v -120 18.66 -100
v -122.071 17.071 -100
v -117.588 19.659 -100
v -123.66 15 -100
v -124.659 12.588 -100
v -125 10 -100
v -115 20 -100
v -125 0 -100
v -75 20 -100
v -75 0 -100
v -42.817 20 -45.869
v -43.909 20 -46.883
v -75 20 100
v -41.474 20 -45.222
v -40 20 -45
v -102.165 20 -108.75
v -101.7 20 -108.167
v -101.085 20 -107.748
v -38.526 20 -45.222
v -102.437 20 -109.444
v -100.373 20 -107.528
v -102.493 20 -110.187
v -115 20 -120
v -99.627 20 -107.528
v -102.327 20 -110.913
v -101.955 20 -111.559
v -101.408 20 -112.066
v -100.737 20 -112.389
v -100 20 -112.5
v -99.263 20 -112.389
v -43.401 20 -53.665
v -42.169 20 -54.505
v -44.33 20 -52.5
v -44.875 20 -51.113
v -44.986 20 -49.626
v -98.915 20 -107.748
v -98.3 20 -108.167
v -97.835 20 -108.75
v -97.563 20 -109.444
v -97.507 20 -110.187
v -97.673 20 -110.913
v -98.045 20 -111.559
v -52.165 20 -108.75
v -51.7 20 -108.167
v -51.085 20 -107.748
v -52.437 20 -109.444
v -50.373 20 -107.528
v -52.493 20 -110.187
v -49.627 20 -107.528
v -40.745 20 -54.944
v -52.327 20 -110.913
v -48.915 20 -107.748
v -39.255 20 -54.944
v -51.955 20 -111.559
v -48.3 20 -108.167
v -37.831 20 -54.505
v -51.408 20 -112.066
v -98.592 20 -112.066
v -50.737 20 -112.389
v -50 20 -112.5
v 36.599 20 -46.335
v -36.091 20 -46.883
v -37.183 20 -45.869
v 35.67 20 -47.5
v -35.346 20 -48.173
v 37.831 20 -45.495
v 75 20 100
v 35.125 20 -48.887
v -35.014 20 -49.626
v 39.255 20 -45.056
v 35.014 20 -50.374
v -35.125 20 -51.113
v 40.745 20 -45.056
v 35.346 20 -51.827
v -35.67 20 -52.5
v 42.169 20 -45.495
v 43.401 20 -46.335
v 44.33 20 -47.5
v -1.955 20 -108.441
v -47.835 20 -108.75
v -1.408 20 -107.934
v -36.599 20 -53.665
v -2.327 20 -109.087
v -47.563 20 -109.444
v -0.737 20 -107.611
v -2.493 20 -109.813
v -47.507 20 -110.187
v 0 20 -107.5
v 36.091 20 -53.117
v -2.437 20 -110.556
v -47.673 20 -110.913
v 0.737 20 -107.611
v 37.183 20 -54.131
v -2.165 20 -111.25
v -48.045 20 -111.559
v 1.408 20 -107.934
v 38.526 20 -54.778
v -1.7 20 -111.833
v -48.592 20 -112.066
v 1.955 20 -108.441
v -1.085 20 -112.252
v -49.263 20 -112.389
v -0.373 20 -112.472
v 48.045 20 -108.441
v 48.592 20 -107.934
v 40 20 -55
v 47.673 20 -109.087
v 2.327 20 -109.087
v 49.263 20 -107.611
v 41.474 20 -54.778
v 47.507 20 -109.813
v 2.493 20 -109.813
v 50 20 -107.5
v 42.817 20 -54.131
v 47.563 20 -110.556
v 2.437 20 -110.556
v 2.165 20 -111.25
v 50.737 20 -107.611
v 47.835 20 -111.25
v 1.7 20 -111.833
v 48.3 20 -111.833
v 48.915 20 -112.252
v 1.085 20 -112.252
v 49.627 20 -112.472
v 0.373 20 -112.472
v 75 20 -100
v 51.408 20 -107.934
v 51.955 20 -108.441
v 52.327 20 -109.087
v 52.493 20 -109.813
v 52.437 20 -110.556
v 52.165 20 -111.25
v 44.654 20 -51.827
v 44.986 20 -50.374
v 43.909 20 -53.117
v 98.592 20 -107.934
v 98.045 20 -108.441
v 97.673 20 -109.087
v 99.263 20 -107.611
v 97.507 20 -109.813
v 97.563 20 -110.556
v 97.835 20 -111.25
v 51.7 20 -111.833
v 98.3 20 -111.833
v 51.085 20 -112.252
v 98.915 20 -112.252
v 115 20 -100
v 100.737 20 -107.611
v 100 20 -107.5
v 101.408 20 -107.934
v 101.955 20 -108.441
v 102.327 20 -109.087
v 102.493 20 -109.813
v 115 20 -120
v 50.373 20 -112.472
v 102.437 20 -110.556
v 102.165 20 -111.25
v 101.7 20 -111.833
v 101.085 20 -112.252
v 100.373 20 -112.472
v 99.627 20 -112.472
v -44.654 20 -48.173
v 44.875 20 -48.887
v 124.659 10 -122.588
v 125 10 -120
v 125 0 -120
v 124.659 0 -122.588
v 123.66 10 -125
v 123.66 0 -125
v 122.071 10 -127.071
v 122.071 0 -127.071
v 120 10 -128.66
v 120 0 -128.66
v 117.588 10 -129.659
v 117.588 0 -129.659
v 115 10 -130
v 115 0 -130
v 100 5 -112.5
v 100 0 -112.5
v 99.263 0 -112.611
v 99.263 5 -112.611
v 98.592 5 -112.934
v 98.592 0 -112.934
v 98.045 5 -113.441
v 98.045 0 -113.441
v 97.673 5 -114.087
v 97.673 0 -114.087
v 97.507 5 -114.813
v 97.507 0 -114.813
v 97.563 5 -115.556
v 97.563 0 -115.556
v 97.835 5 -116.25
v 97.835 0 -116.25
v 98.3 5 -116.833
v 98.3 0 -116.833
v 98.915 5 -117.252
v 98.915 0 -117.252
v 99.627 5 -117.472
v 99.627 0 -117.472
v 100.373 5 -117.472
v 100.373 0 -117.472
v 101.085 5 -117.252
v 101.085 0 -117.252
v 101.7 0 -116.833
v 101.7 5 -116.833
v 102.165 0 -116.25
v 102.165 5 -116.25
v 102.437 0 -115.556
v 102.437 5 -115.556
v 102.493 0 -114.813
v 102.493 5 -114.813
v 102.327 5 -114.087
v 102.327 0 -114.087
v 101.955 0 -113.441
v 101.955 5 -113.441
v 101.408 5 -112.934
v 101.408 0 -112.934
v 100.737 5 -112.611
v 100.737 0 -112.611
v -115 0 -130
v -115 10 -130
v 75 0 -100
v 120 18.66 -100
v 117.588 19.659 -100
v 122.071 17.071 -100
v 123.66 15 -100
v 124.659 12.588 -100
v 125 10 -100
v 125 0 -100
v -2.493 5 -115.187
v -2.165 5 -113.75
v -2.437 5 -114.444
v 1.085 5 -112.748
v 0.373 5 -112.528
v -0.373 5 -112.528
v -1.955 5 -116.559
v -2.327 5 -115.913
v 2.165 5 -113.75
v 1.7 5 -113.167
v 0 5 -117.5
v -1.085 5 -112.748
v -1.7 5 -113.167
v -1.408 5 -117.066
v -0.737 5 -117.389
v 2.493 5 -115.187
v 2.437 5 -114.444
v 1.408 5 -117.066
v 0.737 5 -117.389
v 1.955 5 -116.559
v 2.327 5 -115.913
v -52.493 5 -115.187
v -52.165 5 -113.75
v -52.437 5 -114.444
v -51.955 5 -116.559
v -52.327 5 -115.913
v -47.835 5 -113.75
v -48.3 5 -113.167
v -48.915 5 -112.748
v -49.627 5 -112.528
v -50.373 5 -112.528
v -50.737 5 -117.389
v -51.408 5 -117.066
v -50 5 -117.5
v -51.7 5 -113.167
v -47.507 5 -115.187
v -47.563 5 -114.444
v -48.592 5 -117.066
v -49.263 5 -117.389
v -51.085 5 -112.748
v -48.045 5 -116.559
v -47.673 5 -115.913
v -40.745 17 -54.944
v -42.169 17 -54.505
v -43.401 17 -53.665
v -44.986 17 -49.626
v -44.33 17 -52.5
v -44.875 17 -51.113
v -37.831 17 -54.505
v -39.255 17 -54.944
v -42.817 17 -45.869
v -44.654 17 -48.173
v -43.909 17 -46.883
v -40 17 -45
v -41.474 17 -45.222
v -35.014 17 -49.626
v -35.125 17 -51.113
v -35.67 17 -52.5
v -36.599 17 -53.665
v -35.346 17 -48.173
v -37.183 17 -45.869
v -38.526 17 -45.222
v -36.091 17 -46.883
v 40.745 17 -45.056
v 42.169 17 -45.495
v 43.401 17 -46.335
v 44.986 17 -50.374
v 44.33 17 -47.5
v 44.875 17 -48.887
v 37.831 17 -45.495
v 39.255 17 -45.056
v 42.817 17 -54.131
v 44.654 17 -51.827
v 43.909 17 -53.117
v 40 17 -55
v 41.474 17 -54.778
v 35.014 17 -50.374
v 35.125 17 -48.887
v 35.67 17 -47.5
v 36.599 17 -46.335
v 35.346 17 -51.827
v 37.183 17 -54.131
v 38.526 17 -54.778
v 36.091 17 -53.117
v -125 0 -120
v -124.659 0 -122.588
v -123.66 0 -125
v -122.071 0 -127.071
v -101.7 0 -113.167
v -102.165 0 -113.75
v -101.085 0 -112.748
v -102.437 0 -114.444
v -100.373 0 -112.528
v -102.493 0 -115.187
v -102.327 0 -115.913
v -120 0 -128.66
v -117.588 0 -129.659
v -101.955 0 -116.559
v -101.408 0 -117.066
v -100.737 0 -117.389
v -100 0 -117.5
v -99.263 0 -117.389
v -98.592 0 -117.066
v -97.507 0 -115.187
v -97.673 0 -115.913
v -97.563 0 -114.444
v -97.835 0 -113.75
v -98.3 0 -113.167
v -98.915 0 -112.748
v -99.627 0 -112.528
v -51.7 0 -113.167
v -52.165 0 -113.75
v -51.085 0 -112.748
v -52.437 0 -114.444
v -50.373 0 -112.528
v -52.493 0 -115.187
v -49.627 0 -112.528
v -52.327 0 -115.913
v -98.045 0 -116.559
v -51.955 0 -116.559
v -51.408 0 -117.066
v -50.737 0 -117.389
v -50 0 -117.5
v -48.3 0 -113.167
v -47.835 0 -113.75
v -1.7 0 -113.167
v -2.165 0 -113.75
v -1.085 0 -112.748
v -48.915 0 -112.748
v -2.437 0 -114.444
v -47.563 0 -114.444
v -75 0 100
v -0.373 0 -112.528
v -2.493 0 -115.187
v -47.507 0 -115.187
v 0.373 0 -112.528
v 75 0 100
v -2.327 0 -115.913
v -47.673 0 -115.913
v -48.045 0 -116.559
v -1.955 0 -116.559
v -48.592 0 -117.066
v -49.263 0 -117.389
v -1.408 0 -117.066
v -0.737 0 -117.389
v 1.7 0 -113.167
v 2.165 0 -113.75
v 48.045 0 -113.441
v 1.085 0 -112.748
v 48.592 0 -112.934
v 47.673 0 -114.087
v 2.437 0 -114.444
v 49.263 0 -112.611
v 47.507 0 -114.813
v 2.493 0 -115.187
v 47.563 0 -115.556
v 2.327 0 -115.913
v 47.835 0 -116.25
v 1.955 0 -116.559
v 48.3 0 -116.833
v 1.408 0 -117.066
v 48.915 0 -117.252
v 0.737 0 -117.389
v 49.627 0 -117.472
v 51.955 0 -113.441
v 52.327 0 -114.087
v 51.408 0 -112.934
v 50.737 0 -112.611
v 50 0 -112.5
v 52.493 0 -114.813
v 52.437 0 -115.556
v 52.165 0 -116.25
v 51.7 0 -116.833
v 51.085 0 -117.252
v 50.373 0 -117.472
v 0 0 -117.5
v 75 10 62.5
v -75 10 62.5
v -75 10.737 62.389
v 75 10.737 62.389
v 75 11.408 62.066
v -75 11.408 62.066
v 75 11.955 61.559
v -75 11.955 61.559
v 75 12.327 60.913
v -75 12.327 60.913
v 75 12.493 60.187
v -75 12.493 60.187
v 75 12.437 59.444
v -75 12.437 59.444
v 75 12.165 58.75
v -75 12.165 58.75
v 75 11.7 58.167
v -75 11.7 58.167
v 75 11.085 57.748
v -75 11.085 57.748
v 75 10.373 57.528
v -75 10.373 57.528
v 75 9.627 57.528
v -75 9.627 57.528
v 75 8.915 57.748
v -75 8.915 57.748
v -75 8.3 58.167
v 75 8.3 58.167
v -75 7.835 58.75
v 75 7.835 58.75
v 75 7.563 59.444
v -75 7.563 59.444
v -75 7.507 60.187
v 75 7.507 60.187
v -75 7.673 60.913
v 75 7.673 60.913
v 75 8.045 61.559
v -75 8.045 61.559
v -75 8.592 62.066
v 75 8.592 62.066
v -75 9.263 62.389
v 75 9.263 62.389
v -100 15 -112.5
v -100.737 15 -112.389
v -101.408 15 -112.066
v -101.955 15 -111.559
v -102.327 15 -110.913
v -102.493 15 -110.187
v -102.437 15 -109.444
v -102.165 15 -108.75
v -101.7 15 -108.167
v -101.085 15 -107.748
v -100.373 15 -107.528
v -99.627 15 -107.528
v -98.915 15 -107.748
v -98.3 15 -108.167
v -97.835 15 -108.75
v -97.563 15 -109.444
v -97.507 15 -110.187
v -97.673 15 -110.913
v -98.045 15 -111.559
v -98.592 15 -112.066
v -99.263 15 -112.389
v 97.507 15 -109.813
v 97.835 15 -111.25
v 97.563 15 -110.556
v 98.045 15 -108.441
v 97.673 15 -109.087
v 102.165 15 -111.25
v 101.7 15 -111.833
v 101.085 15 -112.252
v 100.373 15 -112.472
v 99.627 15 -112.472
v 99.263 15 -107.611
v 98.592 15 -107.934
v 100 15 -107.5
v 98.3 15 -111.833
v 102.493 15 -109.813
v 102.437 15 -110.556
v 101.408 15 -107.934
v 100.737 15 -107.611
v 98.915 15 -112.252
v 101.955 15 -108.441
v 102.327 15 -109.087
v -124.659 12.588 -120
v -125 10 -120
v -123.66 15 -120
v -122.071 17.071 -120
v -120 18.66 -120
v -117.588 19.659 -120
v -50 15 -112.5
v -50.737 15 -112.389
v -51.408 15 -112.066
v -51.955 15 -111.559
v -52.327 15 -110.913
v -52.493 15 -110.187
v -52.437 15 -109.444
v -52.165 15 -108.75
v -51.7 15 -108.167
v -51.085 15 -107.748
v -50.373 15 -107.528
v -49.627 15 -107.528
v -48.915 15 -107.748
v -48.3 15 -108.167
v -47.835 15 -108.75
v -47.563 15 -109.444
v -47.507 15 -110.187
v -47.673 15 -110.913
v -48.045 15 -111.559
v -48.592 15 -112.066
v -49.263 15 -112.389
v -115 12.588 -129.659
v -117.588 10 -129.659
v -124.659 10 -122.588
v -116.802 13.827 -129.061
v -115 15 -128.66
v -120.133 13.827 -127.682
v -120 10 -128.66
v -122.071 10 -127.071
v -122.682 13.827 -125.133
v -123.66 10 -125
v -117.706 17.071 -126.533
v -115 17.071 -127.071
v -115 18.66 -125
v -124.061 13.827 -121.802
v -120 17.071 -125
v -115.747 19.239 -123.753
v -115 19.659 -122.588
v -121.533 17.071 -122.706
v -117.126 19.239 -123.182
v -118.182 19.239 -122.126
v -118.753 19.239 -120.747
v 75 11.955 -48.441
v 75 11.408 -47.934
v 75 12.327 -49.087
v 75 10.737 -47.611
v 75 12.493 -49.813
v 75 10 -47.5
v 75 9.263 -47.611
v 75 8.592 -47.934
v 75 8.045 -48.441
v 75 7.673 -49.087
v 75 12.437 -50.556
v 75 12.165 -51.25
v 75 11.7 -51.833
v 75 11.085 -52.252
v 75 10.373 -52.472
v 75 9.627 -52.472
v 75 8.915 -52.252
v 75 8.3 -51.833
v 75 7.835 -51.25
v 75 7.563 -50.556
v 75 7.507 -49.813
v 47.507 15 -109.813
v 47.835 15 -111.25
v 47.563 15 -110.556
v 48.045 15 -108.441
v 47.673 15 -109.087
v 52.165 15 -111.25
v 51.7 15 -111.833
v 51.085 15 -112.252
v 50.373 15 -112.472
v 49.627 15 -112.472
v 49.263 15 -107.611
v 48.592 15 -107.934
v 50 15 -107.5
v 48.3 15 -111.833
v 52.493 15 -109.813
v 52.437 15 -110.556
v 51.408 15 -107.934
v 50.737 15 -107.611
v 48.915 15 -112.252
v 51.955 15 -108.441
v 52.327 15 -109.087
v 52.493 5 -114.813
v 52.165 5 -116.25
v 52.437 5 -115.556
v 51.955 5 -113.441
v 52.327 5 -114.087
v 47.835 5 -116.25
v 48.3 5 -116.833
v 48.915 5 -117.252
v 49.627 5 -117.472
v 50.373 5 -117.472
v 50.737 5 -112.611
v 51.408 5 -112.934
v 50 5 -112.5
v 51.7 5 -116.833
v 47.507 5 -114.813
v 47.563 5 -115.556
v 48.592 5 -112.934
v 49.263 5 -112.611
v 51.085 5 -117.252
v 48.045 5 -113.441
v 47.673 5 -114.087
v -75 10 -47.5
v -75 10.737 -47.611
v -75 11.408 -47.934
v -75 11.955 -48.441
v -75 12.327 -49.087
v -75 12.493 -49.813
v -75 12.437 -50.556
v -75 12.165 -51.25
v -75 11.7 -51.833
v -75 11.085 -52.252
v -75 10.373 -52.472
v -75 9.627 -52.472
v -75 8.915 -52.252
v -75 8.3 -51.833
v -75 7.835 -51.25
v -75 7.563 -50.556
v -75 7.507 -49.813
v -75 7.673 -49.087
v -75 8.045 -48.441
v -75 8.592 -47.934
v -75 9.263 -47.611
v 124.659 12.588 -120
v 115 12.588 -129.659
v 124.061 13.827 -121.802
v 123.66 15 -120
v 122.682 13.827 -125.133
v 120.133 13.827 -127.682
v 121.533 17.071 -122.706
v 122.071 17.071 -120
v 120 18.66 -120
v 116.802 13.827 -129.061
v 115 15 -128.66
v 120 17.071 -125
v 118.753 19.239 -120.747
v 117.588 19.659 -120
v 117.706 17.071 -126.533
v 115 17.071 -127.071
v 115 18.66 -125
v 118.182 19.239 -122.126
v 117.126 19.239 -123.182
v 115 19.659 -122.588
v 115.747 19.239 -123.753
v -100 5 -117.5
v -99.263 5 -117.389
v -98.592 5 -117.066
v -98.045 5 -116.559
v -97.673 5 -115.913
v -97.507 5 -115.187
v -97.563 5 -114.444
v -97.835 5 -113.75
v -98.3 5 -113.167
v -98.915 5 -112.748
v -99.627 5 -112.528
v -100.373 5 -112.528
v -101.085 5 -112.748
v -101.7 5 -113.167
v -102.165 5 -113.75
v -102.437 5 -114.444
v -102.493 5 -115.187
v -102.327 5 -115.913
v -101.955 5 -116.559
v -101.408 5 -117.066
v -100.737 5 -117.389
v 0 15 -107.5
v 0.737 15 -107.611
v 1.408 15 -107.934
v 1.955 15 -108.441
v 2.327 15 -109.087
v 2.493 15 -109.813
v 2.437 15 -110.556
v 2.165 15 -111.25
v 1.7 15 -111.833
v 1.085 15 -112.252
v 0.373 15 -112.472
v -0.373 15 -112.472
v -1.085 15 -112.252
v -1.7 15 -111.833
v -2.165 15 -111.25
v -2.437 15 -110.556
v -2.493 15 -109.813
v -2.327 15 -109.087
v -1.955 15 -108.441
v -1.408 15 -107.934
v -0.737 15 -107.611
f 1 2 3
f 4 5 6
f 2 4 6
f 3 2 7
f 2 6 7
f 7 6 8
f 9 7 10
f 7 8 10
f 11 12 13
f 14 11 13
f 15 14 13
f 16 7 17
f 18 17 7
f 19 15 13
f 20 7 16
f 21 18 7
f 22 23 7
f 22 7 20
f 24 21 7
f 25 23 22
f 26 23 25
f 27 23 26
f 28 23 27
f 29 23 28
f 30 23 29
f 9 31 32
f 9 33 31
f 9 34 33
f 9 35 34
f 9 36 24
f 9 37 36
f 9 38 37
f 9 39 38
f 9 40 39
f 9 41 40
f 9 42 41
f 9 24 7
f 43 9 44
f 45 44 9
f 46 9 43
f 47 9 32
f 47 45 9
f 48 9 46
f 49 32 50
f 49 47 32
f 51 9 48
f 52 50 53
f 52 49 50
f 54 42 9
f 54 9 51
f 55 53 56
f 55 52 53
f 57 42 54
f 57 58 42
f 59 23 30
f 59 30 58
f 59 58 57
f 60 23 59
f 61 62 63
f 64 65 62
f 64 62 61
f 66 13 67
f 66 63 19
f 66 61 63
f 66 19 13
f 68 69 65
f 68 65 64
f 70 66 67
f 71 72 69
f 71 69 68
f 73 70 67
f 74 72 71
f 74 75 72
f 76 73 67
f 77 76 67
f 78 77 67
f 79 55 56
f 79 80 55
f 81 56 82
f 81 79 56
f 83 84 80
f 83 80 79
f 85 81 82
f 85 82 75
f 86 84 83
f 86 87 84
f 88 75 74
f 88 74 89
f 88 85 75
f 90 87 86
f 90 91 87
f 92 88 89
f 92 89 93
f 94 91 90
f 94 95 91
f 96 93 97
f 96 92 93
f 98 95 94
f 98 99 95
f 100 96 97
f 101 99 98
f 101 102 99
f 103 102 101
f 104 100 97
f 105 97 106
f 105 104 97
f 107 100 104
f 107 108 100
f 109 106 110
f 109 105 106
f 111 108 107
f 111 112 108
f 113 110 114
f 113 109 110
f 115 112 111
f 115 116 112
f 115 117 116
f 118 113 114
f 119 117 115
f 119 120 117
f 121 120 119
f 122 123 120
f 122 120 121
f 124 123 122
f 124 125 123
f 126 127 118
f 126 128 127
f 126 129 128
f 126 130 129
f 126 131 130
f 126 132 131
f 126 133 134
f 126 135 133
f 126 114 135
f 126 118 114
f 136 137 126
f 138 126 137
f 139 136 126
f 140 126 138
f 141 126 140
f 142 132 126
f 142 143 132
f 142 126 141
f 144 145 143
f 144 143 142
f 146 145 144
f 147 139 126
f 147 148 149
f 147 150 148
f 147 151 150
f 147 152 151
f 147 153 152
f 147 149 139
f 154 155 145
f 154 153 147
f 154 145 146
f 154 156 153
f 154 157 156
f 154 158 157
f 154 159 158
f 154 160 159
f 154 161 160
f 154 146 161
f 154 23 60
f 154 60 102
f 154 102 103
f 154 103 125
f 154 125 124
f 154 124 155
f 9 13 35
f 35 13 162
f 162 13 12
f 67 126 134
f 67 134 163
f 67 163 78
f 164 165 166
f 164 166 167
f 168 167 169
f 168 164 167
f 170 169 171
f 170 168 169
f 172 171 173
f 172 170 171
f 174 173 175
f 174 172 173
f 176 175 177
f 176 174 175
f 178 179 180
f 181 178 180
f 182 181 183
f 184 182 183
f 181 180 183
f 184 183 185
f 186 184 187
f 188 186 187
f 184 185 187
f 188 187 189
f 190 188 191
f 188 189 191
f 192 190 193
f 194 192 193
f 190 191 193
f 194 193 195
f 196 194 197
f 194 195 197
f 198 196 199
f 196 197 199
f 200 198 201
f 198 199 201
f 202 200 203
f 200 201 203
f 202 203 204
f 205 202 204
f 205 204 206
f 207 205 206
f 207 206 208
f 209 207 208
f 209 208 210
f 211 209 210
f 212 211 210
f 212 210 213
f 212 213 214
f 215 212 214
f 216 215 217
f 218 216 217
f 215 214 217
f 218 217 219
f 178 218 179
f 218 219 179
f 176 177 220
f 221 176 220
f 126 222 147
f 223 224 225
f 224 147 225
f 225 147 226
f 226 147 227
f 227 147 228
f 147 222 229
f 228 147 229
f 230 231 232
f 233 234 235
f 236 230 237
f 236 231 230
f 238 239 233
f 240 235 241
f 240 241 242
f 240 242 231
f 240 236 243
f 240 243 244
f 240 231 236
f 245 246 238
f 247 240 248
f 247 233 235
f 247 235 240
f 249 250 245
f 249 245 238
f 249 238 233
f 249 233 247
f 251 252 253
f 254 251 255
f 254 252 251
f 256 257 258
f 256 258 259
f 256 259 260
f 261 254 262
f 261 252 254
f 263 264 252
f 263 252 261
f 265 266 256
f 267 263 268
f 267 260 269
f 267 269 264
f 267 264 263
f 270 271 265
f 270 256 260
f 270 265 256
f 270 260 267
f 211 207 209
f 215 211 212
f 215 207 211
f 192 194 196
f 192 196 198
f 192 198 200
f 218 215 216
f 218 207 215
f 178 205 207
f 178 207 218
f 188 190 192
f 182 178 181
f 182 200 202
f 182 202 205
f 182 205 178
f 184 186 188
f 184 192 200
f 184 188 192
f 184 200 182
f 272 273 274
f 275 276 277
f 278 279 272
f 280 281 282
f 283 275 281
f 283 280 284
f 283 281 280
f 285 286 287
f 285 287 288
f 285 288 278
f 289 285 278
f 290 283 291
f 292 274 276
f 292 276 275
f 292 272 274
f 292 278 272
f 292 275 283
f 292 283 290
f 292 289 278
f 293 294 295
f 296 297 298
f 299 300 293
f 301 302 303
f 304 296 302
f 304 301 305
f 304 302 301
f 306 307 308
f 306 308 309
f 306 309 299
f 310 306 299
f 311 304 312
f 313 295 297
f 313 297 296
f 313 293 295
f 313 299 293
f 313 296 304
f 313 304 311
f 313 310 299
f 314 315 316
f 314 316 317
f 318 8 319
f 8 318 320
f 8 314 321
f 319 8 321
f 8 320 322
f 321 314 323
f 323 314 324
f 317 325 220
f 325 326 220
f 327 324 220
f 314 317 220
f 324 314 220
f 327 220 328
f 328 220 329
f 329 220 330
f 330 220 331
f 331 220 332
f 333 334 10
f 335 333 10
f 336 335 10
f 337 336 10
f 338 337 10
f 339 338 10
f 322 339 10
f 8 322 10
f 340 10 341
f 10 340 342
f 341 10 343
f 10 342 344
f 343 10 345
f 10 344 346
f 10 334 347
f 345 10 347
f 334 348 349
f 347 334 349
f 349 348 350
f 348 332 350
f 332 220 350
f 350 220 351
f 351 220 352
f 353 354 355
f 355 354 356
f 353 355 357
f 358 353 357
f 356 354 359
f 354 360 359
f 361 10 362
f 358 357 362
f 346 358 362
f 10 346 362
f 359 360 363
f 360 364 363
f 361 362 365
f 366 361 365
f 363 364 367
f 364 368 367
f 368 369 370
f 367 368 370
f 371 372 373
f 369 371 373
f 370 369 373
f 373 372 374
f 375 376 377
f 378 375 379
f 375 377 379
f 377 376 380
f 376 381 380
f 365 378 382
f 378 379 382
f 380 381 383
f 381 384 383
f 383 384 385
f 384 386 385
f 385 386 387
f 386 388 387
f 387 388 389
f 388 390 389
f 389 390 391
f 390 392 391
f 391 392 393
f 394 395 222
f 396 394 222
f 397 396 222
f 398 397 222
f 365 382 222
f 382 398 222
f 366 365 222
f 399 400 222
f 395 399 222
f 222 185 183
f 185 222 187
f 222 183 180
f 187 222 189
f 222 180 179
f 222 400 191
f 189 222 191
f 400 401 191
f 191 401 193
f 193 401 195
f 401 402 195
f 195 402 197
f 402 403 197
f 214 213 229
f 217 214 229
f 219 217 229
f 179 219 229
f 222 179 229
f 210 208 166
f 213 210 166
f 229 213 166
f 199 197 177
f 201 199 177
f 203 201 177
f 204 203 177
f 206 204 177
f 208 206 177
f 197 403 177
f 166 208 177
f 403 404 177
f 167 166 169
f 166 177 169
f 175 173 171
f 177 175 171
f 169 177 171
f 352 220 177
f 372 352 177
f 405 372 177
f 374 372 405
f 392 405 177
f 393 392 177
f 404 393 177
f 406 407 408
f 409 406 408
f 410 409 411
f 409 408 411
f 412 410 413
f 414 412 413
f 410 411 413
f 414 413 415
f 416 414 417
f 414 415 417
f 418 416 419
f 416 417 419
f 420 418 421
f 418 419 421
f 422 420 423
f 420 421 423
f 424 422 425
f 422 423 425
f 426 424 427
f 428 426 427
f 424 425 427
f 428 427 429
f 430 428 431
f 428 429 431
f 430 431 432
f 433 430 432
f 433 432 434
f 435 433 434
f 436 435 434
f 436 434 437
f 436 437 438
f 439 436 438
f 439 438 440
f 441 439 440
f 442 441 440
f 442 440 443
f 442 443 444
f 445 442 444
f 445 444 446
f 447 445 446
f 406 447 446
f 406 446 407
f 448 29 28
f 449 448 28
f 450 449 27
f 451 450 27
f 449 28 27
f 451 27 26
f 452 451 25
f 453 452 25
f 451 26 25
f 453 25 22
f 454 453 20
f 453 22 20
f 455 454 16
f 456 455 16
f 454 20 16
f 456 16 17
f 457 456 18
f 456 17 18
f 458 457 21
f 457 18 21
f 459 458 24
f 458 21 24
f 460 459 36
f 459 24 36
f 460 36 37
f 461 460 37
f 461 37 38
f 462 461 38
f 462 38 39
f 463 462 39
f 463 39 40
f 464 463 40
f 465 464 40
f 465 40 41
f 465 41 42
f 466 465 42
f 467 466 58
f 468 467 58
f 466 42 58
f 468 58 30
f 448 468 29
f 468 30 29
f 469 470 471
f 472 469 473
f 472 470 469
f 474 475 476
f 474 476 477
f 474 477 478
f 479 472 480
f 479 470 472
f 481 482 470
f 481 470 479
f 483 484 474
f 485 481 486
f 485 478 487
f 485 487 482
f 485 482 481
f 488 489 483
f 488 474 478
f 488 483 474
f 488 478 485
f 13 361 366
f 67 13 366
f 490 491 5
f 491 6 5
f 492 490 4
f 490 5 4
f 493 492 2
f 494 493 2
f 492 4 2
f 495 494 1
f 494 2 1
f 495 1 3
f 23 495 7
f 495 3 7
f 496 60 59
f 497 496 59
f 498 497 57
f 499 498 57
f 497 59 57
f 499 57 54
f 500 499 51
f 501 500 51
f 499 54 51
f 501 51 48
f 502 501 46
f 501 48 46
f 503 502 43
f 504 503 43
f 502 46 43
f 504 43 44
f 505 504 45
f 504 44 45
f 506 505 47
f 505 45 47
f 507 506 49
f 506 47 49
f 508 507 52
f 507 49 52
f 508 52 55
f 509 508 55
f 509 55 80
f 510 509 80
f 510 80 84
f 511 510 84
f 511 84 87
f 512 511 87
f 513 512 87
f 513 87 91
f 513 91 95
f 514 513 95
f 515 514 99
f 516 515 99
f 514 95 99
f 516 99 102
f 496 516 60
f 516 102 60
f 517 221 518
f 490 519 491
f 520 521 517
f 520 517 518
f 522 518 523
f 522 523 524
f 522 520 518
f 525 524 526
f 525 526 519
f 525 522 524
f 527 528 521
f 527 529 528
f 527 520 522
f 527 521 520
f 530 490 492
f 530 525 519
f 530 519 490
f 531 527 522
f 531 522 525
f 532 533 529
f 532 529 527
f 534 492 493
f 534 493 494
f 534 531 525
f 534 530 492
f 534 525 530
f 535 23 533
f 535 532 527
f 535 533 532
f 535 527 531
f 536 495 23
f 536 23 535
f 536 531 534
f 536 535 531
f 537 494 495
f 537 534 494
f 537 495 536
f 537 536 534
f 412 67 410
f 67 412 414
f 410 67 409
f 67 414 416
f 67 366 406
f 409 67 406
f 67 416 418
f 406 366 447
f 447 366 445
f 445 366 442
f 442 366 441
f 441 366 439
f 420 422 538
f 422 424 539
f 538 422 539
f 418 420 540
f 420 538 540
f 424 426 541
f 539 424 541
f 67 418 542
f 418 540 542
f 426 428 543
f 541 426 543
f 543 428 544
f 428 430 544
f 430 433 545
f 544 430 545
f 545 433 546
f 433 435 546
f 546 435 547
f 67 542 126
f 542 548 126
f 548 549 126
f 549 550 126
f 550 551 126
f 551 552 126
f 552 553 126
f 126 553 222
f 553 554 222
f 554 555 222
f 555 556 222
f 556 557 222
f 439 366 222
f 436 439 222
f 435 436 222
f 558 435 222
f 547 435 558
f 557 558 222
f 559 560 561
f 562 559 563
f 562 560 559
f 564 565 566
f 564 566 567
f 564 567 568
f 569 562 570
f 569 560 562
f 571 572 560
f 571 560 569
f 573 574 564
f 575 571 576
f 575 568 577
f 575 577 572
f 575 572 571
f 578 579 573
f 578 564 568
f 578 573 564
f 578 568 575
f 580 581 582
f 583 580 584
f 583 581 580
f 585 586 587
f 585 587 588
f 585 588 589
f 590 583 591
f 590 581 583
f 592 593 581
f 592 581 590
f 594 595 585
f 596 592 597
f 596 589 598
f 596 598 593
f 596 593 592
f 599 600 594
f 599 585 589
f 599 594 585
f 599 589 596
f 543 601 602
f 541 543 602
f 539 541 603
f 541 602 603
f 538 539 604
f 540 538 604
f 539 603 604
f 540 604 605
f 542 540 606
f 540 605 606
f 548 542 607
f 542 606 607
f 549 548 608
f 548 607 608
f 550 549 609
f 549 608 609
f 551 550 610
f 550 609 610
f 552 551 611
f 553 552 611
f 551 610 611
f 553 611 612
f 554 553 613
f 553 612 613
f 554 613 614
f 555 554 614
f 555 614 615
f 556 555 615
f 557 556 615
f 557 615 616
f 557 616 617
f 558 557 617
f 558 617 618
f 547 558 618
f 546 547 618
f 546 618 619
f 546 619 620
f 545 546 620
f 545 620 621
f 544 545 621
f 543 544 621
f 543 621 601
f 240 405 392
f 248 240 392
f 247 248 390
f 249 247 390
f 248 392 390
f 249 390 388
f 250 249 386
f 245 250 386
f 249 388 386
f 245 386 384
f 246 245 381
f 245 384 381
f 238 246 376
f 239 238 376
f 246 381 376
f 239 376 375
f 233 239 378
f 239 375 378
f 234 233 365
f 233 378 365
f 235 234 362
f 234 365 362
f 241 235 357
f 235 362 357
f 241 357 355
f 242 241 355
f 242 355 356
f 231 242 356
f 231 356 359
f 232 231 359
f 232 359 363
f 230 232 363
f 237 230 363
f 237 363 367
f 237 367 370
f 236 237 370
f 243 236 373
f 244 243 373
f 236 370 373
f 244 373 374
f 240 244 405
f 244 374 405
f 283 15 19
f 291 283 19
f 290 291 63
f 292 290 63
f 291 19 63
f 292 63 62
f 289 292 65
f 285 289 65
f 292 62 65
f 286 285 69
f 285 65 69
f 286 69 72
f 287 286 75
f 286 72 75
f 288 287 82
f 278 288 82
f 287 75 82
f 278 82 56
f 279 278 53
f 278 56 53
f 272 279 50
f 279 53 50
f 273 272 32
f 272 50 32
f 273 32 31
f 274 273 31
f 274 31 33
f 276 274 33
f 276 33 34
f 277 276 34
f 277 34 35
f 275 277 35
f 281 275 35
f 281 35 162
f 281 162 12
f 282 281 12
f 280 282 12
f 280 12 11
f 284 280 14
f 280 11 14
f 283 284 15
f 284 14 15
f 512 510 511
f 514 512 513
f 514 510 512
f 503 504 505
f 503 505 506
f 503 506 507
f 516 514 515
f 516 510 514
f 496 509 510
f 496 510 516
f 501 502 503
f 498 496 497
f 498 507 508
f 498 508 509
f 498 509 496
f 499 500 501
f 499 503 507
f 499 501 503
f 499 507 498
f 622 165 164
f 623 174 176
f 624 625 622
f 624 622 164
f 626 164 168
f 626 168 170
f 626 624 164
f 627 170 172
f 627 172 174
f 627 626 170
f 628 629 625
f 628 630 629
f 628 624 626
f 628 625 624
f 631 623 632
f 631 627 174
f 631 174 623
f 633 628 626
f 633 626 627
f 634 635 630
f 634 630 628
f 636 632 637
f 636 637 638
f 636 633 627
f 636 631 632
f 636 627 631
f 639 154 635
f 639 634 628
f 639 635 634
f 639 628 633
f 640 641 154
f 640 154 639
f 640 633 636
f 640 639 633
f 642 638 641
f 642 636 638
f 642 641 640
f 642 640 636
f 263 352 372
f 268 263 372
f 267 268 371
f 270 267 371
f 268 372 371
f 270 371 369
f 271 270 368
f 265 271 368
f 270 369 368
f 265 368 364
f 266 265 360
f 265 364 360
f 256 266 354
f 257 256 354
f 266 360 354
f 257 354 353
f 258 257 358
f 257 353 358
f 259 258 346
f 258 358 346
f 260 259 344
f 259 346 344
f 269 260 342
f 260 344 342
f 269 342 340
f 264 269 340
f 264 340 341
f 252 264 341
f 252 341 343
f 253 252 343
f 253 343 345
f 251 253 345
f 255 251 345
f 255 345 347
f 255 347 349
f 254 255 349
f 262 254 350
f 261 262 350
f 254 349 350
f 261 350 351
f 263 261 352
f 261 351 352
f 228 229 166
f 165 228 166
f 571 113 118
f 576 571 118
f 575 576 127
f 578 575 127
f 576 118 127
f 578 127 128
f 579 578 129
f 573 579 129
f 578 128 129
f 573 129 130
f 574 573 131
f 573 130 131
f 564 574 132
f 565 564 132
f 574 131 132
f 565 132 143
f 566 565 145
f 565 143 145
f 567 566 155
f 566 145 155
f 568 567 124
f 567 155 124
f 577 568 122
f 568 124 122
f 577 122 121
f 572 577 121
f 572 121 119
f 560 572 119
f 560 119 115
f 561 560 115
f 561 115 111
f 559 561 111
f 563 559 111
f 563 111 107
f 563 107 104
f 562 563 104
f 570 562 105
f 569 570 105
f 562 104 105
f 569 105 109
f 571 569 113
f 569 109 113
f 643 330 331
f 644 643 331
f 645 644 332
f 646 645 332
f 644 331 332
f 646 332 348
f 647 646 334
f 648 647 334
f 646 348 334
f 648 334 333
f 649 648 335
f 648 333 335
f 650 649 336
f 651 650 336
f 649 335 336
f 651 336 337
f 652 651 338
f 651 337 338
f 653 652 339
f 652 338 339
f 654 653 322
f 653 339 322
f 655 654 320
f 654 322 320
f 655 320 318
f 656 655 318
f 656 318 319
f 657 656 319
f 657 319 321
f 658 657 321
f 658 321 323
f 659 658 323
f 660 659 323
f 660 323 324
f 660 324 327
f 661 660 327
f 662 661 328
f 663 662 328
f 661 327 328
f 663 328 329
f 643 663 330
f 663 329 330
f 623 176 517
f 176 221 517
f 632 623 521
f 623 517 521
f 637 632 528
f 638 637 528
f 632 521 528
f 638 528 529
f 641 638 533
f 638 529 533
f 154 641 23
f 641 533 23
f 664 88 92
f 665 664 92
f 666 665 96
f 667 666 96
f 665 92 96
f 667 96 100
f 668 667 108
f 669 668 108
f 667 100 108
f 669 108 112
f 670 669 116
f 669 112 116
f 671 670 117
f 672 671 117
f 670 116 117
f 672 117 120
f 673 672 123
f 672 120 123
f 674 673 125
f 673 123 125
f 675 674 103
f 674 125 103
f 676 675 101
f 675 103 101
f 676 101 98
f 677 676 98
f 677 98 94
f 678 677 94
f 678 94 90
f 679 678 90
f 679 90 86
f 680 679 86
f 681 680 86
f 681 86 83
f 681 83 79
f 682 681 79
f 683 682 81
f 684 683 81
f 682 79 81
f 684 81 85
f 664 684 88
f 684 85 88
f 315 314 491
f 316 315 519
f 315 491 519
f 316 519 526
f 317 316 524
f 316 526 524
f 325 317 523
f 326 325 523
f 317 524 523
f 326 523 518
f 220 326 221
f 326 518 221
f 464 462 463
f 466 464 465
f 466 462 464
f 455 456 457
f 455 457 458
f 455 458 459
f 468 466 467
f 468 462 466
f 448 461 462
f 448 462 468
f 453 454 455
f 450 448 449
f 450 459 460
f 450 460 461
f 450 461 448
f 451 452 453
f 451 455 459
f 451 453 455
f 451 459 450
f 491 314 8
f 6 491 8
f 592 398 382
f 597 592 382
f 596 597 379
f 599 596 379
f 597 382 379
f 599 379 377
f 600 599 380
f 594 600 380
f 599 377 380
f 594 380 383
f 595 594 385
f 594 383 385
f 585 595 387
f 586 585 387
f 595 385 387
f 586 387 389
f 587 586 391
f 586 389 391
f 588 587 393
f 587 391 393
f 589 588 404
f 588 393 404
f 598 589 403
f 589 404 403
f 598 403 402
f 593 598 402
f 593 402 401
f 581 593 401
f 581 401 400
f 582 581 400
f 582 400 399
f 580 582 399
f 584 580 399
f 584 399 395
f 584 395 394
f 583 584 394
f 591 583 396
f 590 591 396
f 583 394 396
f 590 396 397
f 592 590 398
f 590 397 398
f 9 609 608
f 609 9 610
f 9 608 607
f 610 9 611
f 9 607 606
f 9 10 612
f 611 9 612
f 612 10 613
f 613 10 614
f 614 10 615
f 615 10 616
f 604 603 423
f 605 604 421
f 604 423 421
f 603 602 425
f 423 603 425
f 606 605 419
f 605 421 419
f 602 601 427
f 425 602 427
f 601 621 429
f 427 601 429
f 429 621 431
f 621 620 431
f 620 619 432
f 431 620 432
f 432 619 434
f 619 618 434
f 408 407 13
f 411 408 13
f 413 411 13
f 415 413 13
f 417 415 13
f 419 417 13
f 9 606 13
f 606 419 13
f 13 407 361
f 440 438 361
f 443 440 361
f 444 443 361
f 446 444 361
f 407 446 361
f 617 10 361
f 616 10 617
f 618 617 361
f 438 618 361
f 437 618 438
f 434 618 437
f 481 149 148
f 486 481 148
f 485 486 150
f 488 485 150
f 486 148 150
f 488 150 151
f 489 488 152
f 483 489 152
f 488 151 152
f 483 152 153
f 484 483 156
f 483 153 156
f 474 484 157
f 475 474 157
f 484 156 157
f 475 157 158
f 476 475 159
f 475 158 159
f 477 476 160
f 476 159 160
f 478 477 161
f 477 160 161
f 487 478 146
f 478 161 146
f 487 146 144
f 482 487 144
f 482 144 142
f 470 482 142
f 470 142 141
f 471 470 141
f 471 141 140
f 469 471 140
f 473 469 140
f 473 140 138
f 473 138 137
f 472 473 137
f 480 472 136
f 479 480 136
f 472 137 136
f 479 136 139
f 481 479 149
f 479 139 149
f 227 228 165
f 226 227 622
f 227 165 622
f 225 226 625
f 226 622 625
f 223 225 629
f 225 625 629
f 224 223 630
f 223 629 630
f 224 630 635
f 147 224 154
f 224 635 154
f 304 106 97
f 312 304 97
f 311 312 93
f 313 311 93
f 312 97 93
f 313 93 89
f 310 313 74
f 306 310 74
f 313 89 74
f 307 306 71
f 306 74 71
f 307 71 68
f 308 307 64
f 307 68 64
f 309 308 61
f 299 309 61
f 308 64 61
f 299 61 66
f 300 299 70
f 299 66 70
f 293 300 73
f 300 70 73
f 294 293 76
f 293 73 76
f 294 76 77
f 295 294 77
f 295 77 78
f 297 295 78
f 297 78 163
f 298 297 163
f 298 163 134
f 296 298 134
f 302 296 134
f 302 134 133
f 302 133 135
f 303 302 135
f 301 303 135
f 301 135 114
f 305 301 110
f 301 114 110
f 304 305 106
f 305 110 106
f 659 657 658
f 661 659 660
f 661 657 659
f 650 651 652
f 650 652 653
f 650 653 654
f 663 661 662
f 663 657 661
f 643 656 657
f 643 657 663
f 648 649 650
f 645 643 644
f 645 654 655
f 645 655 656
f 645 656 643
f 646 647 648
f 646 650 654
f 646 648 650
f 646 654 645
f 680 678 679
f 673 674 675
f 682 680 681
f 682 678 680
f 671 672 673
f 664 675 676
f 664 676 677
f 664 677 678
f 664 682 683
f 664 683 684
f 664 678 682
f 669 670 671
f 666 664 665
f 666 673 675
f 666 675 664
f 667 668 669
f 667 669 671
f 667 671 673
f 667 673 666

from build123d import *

# Parameters (mm, degrees)
BOSS_EXTRUDE1_DEPTH = 20
SKETCH2_R           = 2.5
CUT_EXTRUDE1_DEPTH  = 240.374184072
SKETCH4_R           = 2.5
CUT_EXTRUDE2_DEPTH  = 5
FILLET1_R           = 10
FILLET2_R           = 10
SKETCH6_R           = 2.5
CUT_EXTRUDE3_DEPTH  = 5
SKETCH8_R           = 5
CUT_EXTRUDE5_DEPTH  = 3


with BuildPart() as part:
    # Sketch1 → Boss-Extrude1 (new body)
    with BuildSketch(Plane(origin=(0, 0, 0), x_dir=(1, 0, 0), z_dir=(0, 1, 0))):
        Polygon((-75, -100), (75, -100), (75, 100), (125, 100), (125, 130), (-125, 130), (-125, 100), (-75, 100), align=None)
    extrude(amount=BOSS_EXTRUDE1_DEPTH)

    # Sketch2 → Cut-Extrude1 (cut, through all)
    with BuildSketch(Plane.ZY.offset(75)):
        with Locations((60, 10)):
            Circle(SKETCH2_R)
        with Locations((-50, 10)):
            Circle(SKETCH2_R)
    extrude(amount=-CUT_EXTRUDE1_DEPTH, mode=Mode.SUBTRACT)

    # Sketch4 → Cut-Extrude2 (cut)
    with BuildSketch(Plane.XZ):
        with Locations(Location((-100, -115, 0), (0, 0, 270))):
            Circle(SKETCH4_R)
        with Locations(Location((-50, -115, 0), (0, 0, 270))):
            Circle(SKETCH4_R)
        with Locations(Location((0, -115, 0), (0, 0, 270))):
            Circle(SKETCH4_R)
        with Locations(Location((50, -115, 0), (0, 0, 90))):
            Circle(SKETCH4_R)
        with Locations(Location((100, -115, 0), (0, 0, 90))):
            Circle(SKETCH4_R)
    extrude(amount=-CUT_EXTRUDE2_DEPTH, mode=Mode.SUBTRACT)

    # Fillet1
    fillet1_edges = [part.edges().sort_by_distance(p)[0] for p in [
        (-125, 10, -130),
        (125, 10, -130),
    ]]
    fillet(fillet1_edges, radius=FILLET1_R)

    # Fillet2
    fillet2_edges = [part.edges().sort_by_distance(p)[0] for p in [
        (125, 20, -110),
        (0, 20, -130),
        (-125, 20, -110),
        (-122.071067812, 20, -127.071067812),
        (122.071067812, 20, -127.071067812),
    ]]
    fillet(fillet2_edges, radius=FILLET2_R)

    # Sketch6 → Cut-Extrude3 (cut)
    with BuildSketch(Plane(origin=(0, 20, 0), x_dir=(1, 0, 0), z_dir=(0, 1, 0))):
        with Locations(Location((0, 110, 0), (0, 0, 270))):
            Circle(SKETCH6_R)
        with Locations(Location((50, 110, 0), (0, 0, 270))):
            Circle(SKETCH6_R)
        with Locations(Location((100, 110, 0), (0, 0, 270))):
            Circle(SKETCH6_R)
        with Locations(Location((-50, 110, 0), (0, 0, 90))):
            Circle(SKETCH6_R)
        with Locations(Location((-100, 110, 0), (0, 0, 90))):
            Circle(SKETCH6_R)
    extrude(amount=-CUT_EXTRUDE3_DEPTH, mode=Mode.SUBTRACT)

    # Sketch8 → Cut-Extrude5 (cut)
    with BuildSketch(Plane(origin=(0, 20, 0), x_dir=(1, 0, 0), z_dir=(0, 1, 0))):
        with Locations(Location((-40, 50, 0), (0, 0, 270))):
            Circle(SKETCH8_R)
        with Locations(Location((40, 50, 0), (0, 0, 90))):
            Circle(SKETCH8_R)
    extrude(amount=-CUT_EXTRUDE5_DEPTH, mode=Mode.SUBTRACT)


solid = part.part
